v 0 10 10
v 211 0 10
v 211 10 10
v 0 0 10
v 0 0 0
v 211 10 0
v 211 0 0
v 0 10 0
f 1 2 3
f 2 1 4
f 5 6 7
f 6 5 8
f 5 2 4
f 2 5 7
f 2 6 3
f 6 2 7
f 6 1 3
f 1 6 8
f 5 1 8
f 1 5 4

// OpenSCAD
// Repro INCIDENTS.md 2026-09-04: beam default 211 vs computed 216.5.
module beam(len = 211, w = 10) { cube([len, w, w]); }
beam();
